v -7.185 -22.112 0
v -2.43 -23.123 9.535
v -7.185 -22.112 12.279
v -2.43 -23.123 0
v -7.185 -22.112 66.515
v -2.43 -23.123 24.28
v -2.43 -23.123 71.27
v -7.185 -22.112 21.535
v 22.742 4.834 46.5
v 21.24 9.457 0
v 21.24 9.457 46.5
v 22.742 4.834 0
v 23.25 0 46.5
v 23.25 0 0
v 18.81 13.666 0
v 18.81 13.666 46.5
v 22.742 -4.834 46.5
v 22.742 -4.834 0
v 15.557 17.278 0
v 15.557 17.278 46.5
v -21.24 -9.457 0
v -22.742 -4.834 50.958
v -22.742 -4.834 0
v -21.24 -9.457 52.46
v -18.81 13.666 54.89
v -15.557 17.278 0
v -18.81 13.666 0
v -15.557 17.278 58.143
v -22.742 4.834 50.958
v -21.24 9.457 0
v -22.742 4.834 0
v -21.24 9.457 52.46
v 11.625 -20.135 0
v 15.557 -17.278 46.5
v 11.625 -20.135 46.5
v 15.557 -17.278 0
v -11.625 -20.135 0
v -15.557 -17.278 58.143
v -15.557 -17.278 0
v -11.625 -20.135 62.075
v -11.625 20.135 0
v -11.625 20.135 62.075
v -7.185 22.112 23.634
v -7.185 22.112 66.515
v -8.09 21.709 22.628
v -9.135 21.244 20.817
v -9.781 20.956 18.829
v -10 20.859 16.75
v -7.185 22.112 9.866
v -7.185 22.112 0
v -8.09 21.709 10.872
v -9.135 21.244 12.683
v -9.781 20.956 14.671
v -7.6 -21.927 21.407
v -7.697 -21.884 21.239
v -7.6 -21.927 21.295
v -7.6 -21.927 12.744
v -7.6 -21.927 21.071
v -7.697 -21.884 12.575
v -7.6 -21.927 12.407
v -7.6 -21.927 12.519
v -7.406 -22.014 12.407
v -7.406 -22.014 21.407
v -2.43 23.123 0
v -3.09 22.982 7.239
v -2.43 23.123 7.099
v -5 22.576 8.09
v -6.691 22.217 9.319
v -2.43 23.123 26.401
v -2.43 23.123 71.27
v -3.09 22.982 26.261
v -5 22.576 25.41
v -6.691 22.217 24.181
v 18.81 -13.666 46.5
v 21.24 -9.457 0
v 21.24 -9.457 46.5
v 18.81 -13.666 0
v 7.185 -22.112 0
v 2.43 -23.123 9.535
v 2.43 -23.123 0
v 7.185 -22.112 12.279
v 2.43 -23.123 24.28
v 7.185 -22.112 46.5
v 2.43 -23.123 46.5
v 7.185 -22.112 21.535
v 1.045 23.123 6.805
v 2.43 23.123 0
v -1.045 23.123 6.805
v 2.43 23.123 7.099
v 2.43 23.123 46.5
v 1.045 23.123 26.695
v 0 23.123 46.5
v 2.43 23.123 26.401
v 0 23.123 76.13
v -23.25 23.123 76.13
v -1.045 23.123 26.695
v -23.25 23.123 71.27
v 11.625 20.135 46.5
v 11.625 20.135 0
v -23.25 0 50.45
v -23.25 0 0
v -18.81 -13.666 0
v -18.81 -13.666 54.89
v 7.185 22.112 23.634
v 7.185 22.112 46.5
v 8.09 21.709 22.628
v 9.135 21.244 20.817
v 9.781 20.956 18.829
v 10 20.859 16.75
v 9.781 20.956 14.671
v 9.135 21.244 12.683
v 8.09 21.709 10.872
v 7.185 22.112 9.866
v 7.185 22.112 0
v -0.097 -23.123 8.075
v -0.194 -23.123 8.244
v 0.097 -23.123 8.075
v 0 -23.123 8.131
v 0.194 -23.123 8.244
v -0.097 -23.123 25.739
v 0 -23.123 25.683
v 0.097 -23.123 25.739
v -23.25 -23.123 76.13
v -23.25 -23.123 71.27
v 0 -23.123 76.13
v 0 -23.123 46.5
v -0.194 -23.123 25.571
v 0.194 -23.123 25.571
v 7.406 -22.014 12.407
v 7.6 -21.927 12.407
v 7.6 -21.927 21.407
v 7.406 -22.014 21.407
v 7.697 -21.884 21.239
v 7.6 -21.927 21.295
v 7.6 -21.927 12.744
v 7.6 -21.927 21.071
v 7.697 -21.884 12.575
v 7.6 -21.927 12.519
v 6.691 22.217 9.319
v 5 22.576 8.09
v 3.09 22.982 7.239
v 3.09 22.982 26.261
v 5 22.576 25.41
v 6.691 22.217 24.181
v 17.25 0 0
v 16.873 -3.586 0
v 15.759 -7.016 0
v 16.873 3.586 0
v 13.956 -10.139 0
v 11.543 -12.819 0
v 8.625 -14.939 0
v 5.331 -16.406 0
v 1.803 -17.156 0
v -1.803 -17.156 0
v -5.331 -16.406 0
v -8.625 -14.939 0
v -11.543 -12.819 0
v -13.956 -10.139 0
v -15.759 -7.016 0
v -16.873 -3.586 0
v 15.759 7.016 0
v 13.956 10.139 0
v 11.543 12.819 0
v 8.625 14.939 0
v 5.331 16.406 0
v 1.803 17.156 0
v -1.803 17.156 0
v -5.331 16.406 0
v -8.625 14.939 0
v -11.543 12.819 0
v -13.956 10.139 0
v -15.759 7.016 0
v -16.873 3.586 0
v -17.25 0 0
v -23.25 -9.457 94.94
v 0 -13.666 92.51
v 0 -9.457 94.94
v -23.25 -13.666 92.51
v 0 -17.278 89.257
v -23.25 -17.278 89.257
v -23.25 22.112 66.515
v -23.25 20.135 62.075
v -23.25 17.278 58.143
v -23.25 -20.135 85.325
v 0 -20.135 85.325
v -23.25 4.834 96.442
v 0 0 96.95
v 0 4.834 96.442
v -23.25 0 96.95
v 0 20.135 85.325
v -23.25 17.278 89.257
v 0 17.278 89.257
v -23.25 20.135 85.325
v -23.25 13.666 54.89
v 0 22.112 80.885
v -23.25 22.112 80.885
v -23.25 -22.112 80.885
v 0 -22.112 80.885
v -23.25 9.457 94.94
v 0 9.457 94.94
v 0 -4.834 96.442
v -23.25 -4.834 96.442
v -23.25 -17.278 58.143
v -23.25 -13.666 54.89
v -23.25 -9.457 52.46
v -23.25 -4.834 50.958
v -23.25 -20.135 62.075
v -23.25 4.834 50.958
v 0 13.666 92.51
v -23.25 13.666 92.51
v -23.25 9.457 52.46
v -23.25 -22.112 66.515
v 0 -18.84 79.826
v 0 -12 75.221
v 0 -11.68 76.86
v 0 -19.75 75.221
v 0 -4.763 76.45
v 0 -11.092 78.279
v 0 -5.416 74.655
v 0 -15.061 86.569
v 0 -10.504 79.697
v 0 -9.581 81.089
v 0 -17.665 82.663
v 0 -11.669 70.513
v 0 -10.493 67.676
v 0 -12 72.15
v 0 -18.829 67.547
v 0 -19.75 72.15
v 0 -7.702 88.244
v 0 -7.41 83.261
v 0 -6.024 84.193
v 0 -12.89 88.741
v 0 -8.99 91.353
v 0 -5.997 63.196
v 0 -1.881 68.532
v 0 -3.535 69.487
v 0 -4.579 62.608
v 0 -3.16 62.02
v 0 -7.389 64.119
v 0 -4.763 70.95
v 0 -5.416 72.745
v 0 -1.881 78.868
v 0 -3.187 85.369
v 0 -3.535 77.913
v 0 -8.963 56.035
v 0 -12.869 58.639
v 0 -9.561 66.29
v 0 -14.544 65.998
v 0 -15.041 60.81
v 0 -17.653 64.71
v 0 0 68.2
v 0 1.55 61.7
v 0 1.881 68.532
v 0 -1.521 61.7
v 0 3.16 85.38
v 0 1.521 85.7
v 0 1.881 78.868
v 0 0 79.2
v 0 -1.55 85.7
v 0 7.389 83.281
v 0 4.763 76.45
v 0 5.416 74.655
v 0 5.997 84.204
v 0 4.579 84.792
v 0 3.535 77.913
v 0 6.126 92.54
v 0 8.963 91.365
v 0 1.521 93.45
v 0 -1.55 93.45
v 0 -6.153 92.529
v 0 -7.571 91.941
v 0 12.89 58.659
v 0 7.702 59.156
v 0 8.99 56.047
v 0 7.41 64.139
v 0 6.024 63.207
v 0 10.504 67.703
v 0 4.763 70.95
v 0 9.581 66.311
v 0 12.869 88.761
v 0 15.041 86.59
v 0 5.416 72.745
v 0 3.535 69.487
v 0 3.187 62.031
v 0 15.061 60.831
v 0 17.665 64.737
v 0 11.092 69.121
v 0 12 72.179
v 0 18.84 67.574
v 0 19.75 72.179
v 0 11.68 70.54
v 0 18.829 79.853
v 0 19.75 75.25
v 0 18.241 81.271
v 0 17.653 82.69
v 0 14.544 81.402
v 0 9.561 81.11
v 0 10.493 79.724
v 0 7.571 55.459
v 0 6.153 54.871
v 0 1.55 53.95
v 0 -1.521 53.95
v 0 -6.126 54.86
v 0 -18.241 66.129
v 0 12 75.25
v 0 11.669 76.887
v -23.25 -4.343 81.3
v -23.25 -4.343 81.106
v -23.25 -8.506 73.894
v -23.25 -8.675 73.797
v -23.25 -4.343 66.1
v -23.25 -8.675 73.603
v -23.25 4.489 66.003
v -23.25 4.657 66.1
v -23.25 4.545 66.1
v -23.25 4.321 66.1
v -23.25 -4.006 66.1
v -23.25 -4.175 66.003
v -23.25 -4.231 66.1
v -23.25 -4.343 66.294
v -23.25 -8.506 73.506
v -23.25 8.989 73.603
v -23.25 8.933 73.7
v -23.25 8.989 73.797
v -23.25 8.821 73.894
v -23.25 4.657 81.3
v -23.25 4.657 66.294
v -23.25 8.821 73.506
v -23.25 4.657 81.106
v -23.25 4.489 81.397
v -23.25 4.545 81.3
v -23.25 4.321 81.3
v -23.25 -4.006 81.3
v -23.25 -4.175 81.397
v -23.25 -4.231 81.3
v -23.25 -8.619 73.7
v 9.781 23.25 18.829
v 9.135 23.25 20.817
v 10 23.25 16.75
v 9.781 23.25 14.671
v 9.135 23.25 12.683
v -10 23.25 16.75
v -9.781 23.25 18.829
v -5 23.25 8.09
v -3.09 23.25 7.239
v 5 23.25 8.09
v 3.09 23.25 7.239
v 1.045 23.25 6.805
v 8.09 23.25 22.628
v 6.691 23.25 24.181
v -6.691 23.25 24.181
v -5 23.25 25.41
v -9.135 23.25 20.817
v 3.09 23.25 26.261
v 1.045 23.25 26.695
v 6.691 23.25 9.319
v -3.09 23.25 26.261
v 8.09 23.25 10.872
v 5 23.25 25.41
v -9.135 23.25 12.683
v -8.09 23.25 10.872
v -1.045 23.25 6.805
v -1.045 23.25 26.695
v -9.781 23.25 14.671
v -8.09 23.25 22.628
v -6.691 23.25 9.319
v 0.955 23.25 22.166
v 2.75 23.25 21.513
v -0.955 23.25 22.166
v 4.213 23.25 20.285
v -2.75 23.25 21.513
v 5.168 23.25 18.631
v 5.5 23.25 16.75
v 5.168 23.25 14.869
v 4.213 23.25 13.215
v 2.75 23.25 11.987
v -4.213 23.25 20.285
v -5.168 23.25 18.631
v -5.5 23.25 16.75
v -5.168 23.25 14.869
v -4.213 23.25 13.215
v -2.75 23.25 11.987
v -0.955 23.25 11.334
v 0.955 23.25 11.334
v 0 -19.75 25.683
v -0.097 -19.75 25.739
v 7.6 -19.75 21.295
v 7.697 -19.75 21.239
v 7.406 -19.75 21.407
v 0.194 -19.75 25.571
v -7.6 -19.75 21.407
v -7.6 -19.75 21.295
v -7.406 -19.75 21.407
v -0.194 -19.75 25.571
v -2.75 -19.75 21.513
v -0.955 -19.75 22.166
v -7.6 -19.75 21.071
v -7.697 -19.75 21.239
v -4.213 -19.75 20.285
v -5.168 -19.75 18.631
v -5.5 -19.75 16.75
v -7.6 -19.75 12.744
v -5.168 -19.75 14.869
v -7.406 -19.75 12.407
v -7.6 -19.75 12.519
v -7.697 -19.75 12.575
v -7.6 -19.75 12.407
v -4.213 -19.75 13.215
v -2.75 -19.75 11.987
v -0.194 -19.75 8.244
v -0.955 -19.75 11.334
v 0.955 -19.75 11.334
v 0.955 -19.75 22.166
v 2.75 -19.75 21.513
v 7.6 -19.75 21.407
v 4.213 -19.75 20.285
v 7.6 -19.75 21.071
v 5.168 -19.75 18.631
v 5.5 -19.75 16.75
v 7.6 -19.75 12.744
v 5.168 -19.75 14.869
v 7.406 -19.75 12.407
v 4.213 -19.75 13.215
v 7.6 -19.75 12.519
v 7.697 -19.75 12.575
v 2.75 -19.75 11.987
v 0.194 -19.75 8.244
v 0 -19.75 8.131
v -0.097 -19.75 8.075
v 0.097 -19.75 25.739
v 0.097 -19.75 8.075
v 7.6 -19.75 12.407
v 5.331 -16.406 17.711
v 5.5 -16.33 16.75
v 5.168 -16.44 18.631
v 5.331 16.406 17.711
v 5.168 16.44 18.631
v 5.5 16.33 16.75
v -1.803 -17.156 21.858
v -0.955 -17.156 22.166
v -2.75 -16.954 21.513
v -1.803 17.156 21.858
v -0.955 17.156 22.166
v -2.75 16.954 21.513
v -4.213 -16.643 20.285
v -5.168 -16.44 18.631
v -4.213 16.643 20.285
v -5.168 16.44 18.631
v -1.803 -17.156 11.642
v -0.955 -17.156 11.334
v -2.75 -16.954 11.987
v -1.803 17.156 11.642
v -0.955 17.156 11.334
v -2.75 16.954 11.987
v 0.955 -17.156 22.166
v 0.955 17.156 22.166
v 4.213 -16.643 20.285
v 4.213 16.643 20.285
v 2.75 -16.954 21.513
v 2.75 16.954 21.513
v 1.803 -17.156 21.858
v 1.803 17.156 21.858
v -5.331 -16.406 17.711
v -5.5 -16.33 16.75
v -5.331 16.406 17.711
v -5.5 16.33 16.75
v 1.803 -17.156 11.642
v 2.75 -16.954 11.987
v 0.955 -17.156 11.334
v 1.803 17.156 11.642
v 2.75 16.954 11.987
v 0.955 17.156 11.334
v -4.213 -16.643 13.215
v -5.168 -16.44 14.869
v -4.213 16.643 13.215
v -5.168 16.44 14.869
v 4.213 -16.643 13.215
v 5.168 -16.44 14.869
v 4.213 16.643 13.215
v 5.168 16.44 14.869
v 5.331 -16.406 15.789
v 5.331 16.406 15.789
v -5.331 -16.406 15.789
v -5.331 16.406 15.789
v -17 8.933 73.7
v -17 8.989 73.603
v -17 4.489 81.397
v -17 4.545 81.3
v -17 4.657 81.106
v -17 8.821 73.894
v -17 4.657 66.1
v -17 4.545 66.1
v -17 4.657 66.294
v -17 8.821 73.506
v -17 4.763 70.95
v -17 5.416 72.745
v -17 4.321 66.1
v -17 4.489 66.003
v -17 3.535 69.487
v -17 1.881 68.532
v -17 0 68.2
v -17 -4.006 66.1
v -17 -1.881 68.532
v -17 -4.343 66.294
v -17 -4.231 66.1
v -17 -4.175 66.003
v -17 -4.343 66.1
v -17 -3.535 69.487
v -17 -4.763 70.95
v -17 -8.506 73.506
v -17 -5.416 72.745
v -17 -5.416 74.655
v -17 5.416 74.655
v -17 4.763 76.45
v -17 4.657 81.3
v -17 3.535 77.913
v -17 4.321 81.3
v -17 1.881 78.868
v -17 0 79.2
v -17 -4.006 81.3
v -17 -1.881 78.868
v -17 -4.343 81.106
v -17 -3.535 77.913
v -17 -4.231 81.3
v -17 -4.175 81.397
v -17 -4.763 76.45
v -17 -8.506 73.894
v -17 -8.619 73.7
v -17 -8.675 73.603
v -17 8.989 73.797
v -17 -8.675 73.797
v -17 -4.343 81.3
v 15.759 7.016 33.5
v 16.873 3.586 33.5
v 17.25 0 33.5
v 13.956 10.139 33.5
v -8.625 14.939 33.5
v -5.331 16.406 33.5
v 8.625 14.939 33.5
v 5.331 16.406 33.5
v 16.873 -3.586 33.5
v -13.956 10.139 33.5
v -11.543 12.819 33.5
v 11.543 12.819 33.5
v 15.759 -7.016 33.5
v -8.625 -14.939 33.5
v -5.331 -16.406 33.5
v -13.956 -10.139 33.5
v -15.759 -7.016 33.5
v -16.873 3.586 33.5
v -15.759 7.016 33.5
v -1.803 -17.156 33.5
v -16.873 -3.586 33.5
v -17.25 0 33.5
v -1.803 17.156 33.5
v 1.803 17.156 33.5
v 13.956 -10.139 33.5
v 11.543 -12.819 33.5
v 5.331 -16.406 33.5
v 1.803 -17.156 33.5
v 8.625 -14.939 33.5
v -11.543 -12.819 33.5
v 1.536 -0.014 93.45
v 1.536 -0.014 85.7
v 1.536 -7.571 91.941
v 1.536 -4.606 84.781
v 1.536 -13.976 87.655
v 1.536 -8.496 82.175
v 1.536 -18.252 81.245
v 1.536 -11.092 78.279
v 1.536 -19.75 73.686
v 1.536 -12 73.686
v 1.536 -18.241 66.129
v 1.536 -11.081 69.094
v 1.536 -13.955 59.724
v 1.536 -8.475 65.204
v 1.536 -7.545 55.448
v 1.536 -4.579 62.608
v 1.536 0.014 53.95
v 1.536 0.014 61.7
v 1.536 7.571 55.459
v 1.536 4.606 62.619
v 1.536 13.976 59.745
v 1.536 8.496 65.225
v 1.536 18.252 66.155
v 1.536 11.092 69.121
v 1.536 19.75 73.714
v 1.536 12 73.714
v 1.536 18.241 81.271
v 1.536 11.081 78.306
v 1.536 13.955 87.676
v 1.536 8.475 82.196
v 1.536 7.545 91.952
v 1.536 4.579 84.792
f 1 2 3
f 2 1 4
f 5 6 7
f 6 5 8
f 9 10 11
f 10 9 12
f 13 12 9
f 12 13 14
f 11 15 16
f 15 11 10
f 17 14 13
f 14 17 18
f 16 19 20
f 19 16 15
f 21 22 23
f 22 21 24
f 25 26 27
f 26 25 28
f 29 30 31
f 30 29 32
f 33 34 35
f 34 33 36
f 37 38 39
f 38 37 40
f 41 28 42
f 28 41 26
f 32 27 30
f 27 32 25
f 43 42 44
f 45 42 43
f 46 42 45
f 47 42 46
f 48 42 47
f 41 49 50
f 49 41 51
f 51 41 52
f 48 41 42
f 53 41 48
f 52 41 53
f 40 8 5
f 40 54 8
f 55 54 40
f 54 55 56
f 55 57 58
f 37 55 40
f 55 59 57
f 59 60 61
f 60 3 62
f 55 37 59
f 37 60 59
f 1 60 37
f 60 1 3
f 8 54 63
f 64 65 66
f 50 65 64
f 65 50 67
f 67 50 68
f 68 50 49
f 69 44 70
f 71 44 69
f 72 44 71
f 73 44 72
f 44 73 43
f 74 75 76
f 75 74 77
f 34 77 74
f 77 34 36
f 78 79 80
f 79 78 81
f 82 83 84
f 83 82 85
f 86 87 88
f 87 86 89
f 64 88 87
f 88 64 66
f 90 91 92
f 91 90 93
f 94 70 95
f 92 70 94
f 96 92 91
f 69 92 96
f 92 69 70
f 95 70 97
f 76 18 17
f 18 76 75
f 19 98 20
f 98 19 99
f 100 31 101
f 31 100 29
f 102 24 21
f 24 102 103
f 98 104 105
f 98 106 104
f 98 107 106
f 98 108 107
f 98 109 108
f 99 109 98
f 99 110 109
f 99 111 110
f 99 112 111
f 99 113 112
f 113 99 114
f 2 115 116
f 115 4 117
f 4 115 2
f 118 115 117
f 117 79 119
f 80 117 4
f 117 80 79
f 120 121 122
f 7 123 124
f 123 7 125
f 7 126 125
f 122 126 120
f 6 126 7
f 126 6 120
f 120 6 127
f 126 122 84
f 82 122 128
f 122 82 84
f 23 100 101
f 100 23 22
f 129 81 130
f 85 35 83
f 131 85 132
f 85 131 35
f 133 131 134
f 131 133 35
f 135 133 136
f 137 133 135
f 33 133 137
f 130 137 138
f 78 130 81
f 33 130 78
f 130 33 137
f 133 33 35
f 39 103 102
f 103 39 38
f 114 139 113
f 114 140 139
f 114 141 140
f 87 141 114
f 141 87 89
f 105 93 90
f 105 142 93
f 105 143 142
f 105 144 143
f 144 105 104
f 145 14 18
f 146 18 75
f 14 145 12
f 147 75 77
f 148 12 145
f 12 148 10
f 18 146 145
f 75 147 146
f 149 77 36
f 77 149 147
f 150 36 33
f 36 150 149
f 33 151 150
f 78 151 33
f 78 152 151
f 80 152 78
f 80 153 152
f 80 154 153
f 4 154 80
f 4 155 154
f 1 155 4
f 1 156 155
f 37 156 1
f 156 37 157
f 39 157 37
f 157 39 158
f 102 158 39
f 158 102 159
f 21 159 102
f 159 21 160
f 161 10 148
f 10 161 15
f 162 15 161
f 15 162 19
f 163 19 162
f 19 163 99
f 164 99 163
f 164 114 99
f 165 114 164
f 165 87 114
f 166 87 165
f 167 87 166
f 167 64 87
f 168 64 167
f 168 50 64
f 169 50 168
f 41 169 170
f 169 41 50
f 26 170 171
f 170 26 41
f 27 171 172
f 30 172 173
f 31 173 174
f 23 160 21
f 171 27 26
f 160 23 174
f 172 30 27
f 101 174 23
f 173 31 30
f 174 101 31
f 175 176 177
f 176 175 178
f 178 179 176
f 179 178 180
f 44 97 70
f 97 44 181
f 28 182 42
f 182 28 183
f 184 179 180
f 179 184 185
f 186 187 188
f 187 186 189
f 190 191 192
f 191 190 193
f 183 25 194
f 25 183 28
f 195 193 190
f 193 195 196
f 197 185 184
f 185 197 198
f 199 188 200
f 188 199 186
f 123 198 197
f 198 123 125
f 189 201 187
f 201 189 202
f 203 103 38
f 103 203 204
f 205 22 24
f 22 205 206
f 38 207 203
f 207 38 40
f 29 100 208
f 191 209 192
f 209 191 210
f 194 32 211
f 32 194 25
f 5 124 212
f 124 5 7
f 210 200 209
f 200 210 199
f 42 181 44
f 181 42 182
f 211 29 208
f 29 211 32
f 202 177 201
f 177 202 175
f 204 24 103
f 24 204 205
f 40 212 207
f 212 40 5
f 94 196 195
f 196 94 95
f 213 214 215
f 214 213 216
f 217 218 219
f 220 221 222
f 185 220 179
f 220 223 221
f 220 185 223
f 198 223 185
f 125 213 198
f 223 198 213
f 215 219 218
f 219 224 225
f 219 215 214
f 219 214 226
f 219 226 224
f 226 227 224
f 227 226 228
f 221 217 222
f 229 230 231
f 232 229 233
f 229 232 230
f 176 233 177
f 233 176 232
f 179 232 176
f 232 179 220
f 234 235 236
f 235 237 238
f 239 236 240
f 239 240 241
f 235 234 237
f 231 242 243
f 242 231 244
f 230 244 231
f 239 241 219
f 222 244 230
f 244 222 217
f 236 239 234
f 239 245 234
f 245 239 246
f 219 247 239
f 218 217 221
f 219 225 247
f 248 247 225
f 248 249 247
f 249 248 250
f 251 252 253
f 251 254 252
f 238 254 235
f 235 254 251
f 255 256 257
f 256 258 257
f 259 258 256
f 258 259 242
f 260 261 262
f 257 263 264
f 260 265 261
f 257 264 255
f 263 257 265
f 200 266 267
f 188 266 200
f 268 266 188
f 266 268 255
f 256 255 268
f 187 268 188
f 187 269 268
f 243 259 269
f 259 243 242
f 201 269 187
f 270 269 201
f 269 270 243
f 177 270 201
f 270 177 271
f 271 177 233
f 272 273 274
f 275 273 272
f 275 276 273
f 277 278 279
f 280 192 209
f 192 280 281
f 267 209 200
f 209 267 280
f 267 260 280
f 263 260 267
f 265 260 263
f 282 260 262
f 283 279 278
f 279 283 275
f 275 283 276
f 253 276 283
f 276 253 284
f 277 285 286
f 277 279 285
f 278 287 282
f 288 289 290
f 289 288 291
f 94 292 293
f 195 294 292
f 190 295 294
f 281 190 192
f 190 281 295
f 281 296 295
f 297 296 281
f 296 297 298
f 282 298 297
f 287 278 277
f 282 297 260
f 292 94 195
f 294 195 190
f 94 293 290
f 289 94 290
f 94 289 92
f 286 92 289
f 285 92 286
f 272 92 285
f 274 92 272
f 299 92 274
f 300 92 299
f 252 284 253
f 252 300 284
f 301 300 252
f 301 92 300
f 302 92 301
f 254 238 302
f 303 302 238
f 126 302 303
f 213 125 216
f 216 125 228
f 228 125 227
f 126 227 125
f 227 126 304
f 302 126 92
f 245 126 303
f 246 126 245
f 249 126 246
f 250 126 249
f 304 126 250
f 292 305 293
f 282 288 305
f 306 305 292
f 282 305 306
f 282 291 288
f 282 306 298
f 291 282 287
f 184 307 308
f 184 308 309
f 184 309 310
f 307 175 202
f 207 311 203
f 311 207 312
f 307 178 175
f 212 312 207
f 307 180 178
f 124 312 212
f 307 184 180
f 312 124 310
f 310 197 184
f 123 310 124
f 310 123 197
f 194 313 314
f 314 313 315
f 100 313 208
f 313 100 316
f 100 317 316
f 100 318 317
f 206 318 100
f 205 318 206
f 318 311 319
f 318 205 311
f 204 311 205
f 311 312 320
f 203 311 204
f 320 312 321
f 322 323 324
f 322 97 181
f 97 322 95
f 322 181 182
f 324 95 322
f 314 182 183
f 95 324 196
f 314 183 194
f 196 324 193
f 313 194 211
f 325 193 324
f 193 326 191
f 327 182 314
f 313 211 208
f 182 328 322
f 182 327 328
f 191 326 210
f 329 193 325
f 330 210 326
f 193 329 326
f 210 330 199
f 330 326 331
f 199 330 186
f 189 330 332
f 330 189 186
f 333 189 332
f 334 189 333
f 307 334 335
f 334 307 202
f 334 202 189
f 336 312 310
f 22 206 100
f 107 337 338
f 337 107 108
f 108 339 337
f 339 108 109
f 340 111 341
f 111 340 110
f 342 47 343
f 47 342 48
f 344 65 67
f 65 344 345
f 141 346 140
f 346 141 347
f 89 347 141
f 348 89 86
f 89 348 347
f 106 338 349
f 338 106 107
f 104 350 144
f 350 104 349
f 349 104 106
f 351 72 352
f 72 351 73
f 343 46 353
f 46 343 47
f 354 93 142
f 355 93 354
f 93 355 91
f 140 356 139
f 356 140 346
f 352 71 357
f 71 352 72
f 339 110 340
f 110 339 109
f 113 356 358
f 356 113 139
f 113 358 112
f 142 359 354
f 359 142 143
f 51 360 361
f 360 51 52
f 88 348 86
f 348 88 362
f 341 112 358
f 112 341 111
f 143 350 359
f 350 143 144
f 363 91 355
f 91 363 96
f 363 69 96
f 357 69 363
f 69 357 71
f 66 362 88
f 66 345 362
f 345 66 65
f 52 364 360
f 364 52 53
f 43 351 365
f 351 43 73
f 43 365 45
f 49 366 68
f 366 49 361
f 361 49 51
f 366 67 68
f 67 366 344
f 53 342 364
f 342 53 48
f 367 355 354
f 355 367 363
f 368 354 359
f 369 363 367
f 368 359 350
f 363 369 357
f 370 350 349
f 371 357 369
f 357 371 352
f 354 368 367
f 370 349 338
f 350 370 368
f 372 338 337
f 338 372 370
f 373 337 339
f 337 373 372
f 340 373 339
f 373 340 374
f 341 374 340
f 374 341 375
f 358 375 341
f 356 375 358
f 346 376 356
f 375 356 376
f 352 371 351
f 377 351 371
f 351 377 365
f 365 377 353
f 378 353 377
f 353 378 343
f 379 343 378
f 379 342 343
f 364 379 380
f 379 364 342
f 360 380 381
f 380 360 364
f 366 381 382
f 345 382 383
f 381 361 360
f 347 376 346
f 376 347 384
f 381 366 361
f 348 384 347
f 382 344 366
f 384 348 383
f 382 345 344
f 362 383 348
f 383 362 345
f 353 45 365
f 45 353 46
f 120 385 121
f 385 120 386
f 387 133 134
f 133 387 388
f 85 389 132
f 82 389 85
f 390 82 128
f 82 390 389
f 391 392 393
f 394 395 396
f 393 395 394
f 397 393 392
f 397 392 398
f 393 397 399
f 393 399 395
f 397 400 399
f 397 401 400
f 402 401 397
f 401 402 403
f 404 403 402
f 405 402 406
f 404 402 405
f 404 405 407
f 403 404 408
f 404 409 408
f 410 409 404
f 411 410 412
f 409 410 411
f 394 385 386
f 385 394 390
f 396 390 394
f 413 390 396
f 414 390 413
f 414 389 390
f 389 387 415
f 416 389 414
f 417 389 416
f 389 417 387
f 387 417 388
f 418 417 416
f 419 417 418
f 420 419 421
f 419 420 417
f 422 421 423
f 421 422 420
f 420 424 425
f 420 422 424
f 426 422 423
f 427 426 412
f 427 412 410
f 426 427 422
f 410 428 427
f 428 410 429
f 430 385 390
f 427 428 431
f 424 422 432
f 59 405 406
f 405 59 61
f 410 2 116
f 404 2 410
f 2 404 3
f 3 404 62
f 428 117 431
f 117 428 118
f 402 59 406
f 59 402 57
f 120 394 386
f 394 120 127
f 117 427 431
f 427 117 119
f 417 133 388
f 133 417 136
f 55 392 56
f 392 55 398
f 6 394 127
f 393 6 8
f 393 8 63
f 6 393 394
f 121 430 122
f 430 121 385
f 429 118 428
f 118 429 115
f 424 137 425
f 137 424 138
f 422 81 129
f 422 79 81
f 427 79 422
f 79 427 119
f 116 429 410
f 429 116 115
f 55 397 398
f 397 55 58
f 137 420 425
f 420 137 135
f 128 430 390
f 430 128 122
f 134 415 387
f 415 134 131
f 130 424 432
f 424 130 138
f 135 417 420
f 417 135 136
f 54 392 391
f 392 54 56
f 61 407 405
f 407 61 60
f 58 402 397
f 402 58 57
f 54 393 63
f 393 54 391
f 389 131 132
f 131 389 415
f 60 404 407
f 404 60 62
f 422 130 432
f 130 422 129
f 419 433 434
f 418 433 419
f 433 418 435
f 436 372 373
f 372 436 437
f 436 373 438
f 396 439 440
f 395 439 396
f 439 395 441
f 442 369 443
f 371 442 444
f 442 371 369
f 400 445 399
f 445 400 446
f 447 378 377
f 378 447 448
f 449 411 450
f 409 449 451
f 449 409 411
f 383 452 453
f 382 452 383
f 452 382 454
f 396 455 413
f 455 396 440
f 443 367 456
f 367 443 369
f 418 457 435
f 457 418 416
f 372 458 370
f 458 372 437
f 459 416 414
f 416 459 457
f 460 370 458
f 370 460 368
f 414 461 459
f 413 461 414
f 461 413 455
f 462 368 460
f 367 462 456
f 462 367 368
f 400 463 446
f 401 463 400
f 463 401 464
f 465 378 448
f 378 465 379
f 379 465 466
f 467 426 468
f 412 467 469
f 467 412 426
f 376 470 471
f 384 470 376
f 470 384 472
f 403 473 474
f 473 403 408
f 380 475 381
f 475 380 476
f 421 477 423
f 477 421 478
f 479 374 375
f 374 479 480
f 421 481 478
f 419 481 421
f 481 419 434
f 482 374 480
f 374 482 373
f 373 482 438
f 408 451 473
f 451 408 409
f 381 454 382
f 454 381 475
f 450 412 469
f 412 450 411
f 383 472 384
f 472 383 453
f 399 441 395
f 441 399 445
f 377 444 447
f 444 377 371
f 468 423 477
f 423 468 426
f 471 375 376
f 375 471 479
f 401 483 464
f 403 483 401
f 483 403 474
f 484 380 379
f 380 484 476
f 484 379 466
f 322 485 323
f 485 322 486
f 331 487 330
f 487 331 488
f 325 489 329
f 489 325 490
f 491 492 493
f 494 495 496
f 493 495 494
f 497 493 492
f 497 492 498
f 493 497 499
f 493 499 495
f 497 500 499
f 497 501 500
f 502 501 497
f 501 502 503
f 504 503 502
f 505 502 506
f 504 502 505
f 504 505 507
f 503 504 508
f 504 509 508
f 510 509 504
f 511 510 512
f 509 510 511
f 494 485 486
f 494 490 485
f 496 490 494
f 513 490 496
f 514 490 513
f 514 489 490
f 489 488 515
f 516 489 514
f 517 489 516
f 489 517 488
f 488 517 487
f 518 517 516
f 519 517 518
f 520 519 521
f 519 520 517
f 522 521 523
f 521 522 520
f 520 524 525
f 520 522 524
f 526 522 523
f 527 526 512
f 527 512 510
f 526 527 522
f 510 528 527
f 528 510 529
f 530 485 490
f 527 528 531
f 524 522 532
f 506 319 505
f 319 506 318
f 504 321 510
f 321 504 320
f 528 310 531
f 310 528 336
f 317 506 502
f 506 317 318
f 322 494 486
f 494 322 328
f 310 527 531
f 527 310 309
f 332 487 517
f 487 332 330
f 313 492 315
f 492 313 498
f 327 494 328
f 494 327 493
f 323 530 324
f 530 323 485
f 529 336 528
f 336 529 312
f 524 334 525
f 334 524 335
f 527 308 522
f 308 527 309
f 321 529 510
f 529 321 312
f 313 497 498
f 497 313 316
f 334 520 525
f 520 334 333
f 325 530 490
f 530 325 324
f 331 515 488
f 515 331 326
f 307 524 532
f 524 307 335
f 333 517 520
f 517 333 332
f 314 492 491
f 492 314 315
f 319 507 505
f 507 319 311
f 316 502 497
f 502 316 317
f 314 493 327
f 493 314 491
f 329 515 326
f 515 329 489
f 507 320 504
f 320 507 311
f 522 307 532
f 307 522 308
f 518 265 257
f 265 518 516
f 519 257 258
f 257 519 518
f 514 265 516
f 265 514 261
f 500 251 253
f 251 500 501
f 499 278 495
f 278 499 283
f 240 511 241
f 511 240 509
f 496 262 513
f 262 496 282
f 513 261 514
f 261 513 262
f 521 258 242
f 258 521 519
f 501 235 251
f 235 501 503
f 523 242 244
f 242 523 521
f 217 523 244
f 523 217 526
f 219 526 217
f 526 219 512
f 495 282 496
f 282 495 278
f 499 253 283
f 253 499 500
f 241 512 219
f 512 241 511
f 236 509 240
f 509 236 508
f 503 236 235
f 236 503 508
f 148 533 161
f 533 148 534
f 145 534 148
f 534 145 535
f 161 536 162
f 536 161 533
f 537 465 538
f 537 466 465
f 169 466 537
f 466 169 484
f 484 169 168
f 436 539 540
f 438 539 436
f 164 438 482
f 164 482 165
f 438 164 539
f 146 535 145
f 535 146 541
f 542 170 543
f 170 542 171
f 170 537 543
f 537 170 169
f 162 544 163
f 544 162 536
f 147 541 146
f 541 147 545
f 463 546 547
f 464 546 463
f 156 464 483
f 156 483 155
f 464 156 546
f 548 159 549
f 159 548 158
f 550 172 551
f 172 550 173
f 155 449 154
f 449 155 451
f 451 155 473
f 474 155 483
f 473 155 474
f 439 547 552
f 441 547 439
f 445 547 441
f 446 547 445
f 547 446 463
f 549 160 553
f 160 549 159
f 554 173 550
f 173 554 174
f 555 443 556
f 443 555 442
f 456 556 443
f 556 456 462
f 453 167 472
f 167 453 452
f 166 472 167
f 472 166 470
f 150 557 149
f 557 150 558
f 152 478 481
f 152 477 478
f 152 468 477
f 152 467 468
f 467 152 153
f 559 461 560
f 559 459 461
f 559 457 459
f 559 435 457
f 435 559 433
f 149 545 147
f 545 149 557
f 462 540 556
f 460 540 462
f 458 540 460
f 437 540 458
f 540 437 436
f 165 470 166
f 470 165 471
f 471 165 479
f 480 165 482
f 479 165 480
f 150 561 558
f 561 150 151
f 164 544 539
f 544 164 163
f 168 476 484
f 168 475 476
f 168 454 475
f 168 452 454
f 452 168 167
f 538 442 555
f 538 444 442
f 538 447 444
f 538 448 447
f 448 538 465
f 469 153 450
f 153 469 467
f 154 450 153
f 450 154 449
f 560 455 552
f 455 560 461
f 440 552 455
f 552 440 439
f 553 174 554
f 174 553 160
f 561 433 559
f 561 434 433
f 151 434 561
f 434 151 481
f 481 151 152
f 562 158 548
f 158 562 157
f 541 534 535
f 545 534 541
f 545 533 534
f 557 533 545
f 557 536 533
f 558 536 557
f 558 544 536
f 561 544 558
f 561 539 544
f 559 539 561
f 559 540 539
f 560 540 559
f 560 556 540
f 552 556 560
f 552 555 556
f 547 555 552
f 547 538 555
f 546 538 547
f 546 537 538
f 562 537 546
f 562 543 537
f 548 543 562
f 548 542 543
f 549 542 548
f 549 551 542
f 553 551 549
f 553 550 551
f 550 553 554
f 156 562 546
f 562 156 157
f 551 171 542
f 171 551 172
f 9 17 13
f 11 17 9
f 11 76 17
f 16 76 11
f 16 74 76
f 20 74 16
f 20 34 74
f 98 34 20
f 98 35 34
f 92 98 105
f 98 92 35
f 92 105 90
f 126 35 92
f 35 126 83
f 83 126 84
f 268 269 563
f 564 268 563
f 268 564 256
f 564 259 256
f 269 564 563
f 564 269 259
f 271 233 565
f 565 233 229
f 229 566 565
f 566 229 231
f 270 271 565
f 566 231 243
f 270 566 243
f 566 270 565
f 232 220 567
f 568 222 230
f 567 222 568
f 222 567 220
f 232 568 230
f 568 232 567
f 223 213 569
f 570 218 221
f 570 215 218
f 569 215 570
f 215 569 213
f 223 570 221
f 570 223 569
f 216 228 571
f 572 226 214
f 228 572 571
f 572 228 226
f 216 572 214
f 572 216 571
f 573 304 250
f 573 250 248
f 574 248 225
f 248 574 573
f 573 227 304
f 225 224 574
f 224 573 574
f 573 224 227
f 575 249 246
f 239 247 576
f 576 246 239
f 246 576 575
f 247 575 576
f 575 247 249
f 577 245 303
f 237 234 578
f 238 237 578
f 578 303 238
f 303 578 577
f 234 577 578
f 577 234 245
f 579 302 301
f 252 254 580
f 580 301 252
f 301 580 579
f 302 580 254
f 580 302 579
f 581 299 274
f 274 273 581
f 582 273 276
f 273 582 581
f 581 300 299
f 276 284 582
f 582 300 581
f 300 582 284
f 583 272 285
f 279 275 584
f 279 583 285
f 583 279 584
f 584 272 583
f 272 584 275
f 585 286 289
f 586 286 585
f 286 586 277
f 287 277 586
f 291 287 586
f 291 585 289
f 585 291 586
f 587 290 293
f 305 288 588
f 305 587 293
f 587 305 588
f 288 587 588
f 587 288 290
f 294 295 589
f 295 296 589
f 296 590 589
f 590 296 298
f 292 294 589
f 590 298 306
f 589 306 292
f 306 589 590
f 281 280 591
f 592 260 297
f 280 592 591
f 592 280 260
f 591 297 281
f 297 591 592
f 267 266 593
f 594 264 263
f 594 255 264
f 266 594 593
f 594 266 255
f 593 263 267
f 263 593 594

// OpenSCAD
/*

    WIP Joint for connecting two lenths of PVC pipe at adjustable angles.
    
    Print with pipe opening down for best bed adhesion, lowest pipe opening
    distortion and strongest teeth.  
    
    Lots of testing remains to get fitings and clearances correct, and also
    needs work on being properly parametric as well as field testing for 
    strength, durability, etc. (details in TODO's below).

*/

// TODO: Increase negative tooth depth, consider increasing tooth size, reducing tooth count
// TODO: Fix parametrics (maybe just don't resize anything but the pipe openings for now?)
// TODO: Create a third end type that can sandwich-in to create n-ended joints
// TODO: Extract rotate_about into a separate utility module file
// TOOD: Extract the bolt into a separate reusable module file
// TODO: Make bolt size more parametric

// Globals
TOLERANCE = 1;

// Rotates object around specified point
module rotate_about_pt(z, y, pt) {
    translate(pt)
        rotate([0, y, z])
            translate(-pt)
                children();   
}

// 3/8" bolt 
// l pareamter determines the overall length of the bolt
// t parameter increases dimensions to compensate for printer tolerance
module bolt(l, t){
    
    BOLT_LENGTH = l;
    HEAD_LENGTH = 14.2 + t;
    HEAD_WIDTH = 8 + t;
    HEAD_HEIGHT = 6 + t;
    SHAFT_DIAMETER = 10 + t;
    
    cylinder(r=SHAFT_DIAMETER/2,h=BOLT_LENGTH);
    translate([-HEAD_LENGTH/2,-HEAD_LENGTH/3.5,BOLT_LENGTH-HEAD_HEIGHT]){        
        cube([HEAD_LENGTH, HEAD_WIDTH, HEAD_HEIGHT]);
        rotate_about_pt(60,0,[HEAD_LENGTH/2,HEAD_WIDTH/2,0]){
            cube([HEAD_LENGTH, HEAD_WIDTH, HEAD_HEIGHT]);
            rotate_about_pt(60,0,[HEAD_LENGTH/2,HEAD_WIDTH/2,0]){
                cube([HEAD_LENGTH, HEAD_WIDTH, HEAD_HEIGHT]);
            }
        }
    }
}

// Adjustable joint for 1" PVC
// teeth parameter determines if this is the end with teeth
// count parameter determines the number of teeth
module pvc_joint(teeth, count) {

    PIPE_OD = 33.5; //34; //25.5;
    //PIPE_OD = 21.61;
    WALL_THICKNESS = 13;
    OUTER_SHELL_OD = PIPE_OD+WALL_THICKNESS;
    JOINT_BOLT_LENGTH = 50; // ~2" ???
    PIPE_BOLT_LENGTH = 57;  // ~2.25" ???
    SOCKET_OD = 24;         // Diameter of socket used to tighten joint

    difference(){
        union(){
            
            // Main outer shell
            cylinder(r=OUTER_SHELL_OD/2, h=OUTER_SHELL_OD*1.6);
            
            // Joint
             translate([0,0,PIPE_OD*2.2]){
                rotate([0,-90,0]){
                    cylinder(r=OUTER_SHELL_OD/2,h=OUTER_SHELL_OD/2);
                }
            }
            
            // Cylinder for the pipe bolt nut to tighten against
            translate([0,OUTER_SHELL_OD/2,PIPE_OD/2]){
                    rotate([90,0,0]){
                        cylinder(r=10,h=PIPE_OD);
                }
            }
        }        
        
        // Pipe opening
        cylinder(r=(PIPE_OD+TOLERANCE)/2, h=PIPE_OD);
        // NOTE: This reduces the openting for 1/2" pipe (would be better to scale the whole thing)
        //cylinder(r=(22+TOLERANCE)/2, h=PIPE_OD);
        
        // Pipe bolt hole
        // NOTE: "10" is kind of a magic number here, it will vary
        // depending on the size of the bolt head, which is fixed
        // for now but once this is fully parametric will need to change
        translate([0,PIPE_BOLT_LENGTH-(PIPE_OD/2)-10,PIPE_OD/2]){
                rotate([90,0,0]){             
                bolt(PIPE_BOLT_LENGTH, TOLERANCE);
            }
        }
        
        // Cut-away
        translate([0,-OUTER_SHELL_OD/2,OUTER_SHELL_OD]){
            cube([PIPE_OD,OUTER_SHELL_OD,PIPE_OD*2]);
        }        
                
        // If this end has teeth, cut the bolt hole
        // and countersink the head
        if (teeth){
            
            // Joint bolt hole
            translate([26,0,PIPE_OD*2.2]){
                rotate([0,-90,0]){
                    bolt(JOINT_BOLT_LENGTH, TOLERANCE);
                }
            }
            
        } else {
            
            // If this is the end without teeth, cut a 
            // hole for the bolt, a hole to countersink
            // the washer & nut and then grooves for the teeth
            
            // Joint bolt hole
            translate([5,0,PIPE_OD*2.2]){
                rotate([0,-90,0]){
                    bolt(JOINT_BOLT_LENGTH, TOLERANCE);
                }
            }
            
            // Joint nut & washer countersink
            // SOCKET_OD should accomodate putting a socket
            // on the nut to tighten the joint
            translate([-OUTER_SHELL_OD/3,0,PIPE_OD*2.2]){
                rotate([0,-90,0]){
                    cylinder(r=(SOCKET_OD+TOLERANCE)/2,h=PIPE_OD/2);
                }
            }            
            
            // Grooves for the teeth
            translate([1.5,0,PIPE_OD*2.2]){                
                for(i=[0:count]){
                    rotate([i*(360/count),0,0]){
                        translate([0,-3.55,11.5]){
                            rotate([0,0,45]){
                                cube([5,5,OUTER_SHELL_OD/5]);
                            }
                        }
                    }
                }
            }             
        }
    }

    // Teeth
    if (teeth){
        translate([-2,0,PIPE_OD*2.2]){
            for(i=[0:count]){
                rotate([i*(360/count),0,0]){
                    translate([0,-3.55,12]){
                        rotate([0,0,45]){
                            cube([5,5,OUTER_SHELL_OD/6]);
                        }
                    }
                }
            }
        }
    }
}

// Sample layout
pvc_joint(teeth=true, count=16);

/*
// Two-way joint
color("blue"){
    translate([10,0,149.5]){
        rotate([180,0,0]){
            rotate([0,0,180]){
                pvc_joint(teeth=true, count=20);
            }
        }
    }
}
*/

/*
// Ruler
translate([25,0,0]){
    cube([10,10,127.5]);
}
*/
